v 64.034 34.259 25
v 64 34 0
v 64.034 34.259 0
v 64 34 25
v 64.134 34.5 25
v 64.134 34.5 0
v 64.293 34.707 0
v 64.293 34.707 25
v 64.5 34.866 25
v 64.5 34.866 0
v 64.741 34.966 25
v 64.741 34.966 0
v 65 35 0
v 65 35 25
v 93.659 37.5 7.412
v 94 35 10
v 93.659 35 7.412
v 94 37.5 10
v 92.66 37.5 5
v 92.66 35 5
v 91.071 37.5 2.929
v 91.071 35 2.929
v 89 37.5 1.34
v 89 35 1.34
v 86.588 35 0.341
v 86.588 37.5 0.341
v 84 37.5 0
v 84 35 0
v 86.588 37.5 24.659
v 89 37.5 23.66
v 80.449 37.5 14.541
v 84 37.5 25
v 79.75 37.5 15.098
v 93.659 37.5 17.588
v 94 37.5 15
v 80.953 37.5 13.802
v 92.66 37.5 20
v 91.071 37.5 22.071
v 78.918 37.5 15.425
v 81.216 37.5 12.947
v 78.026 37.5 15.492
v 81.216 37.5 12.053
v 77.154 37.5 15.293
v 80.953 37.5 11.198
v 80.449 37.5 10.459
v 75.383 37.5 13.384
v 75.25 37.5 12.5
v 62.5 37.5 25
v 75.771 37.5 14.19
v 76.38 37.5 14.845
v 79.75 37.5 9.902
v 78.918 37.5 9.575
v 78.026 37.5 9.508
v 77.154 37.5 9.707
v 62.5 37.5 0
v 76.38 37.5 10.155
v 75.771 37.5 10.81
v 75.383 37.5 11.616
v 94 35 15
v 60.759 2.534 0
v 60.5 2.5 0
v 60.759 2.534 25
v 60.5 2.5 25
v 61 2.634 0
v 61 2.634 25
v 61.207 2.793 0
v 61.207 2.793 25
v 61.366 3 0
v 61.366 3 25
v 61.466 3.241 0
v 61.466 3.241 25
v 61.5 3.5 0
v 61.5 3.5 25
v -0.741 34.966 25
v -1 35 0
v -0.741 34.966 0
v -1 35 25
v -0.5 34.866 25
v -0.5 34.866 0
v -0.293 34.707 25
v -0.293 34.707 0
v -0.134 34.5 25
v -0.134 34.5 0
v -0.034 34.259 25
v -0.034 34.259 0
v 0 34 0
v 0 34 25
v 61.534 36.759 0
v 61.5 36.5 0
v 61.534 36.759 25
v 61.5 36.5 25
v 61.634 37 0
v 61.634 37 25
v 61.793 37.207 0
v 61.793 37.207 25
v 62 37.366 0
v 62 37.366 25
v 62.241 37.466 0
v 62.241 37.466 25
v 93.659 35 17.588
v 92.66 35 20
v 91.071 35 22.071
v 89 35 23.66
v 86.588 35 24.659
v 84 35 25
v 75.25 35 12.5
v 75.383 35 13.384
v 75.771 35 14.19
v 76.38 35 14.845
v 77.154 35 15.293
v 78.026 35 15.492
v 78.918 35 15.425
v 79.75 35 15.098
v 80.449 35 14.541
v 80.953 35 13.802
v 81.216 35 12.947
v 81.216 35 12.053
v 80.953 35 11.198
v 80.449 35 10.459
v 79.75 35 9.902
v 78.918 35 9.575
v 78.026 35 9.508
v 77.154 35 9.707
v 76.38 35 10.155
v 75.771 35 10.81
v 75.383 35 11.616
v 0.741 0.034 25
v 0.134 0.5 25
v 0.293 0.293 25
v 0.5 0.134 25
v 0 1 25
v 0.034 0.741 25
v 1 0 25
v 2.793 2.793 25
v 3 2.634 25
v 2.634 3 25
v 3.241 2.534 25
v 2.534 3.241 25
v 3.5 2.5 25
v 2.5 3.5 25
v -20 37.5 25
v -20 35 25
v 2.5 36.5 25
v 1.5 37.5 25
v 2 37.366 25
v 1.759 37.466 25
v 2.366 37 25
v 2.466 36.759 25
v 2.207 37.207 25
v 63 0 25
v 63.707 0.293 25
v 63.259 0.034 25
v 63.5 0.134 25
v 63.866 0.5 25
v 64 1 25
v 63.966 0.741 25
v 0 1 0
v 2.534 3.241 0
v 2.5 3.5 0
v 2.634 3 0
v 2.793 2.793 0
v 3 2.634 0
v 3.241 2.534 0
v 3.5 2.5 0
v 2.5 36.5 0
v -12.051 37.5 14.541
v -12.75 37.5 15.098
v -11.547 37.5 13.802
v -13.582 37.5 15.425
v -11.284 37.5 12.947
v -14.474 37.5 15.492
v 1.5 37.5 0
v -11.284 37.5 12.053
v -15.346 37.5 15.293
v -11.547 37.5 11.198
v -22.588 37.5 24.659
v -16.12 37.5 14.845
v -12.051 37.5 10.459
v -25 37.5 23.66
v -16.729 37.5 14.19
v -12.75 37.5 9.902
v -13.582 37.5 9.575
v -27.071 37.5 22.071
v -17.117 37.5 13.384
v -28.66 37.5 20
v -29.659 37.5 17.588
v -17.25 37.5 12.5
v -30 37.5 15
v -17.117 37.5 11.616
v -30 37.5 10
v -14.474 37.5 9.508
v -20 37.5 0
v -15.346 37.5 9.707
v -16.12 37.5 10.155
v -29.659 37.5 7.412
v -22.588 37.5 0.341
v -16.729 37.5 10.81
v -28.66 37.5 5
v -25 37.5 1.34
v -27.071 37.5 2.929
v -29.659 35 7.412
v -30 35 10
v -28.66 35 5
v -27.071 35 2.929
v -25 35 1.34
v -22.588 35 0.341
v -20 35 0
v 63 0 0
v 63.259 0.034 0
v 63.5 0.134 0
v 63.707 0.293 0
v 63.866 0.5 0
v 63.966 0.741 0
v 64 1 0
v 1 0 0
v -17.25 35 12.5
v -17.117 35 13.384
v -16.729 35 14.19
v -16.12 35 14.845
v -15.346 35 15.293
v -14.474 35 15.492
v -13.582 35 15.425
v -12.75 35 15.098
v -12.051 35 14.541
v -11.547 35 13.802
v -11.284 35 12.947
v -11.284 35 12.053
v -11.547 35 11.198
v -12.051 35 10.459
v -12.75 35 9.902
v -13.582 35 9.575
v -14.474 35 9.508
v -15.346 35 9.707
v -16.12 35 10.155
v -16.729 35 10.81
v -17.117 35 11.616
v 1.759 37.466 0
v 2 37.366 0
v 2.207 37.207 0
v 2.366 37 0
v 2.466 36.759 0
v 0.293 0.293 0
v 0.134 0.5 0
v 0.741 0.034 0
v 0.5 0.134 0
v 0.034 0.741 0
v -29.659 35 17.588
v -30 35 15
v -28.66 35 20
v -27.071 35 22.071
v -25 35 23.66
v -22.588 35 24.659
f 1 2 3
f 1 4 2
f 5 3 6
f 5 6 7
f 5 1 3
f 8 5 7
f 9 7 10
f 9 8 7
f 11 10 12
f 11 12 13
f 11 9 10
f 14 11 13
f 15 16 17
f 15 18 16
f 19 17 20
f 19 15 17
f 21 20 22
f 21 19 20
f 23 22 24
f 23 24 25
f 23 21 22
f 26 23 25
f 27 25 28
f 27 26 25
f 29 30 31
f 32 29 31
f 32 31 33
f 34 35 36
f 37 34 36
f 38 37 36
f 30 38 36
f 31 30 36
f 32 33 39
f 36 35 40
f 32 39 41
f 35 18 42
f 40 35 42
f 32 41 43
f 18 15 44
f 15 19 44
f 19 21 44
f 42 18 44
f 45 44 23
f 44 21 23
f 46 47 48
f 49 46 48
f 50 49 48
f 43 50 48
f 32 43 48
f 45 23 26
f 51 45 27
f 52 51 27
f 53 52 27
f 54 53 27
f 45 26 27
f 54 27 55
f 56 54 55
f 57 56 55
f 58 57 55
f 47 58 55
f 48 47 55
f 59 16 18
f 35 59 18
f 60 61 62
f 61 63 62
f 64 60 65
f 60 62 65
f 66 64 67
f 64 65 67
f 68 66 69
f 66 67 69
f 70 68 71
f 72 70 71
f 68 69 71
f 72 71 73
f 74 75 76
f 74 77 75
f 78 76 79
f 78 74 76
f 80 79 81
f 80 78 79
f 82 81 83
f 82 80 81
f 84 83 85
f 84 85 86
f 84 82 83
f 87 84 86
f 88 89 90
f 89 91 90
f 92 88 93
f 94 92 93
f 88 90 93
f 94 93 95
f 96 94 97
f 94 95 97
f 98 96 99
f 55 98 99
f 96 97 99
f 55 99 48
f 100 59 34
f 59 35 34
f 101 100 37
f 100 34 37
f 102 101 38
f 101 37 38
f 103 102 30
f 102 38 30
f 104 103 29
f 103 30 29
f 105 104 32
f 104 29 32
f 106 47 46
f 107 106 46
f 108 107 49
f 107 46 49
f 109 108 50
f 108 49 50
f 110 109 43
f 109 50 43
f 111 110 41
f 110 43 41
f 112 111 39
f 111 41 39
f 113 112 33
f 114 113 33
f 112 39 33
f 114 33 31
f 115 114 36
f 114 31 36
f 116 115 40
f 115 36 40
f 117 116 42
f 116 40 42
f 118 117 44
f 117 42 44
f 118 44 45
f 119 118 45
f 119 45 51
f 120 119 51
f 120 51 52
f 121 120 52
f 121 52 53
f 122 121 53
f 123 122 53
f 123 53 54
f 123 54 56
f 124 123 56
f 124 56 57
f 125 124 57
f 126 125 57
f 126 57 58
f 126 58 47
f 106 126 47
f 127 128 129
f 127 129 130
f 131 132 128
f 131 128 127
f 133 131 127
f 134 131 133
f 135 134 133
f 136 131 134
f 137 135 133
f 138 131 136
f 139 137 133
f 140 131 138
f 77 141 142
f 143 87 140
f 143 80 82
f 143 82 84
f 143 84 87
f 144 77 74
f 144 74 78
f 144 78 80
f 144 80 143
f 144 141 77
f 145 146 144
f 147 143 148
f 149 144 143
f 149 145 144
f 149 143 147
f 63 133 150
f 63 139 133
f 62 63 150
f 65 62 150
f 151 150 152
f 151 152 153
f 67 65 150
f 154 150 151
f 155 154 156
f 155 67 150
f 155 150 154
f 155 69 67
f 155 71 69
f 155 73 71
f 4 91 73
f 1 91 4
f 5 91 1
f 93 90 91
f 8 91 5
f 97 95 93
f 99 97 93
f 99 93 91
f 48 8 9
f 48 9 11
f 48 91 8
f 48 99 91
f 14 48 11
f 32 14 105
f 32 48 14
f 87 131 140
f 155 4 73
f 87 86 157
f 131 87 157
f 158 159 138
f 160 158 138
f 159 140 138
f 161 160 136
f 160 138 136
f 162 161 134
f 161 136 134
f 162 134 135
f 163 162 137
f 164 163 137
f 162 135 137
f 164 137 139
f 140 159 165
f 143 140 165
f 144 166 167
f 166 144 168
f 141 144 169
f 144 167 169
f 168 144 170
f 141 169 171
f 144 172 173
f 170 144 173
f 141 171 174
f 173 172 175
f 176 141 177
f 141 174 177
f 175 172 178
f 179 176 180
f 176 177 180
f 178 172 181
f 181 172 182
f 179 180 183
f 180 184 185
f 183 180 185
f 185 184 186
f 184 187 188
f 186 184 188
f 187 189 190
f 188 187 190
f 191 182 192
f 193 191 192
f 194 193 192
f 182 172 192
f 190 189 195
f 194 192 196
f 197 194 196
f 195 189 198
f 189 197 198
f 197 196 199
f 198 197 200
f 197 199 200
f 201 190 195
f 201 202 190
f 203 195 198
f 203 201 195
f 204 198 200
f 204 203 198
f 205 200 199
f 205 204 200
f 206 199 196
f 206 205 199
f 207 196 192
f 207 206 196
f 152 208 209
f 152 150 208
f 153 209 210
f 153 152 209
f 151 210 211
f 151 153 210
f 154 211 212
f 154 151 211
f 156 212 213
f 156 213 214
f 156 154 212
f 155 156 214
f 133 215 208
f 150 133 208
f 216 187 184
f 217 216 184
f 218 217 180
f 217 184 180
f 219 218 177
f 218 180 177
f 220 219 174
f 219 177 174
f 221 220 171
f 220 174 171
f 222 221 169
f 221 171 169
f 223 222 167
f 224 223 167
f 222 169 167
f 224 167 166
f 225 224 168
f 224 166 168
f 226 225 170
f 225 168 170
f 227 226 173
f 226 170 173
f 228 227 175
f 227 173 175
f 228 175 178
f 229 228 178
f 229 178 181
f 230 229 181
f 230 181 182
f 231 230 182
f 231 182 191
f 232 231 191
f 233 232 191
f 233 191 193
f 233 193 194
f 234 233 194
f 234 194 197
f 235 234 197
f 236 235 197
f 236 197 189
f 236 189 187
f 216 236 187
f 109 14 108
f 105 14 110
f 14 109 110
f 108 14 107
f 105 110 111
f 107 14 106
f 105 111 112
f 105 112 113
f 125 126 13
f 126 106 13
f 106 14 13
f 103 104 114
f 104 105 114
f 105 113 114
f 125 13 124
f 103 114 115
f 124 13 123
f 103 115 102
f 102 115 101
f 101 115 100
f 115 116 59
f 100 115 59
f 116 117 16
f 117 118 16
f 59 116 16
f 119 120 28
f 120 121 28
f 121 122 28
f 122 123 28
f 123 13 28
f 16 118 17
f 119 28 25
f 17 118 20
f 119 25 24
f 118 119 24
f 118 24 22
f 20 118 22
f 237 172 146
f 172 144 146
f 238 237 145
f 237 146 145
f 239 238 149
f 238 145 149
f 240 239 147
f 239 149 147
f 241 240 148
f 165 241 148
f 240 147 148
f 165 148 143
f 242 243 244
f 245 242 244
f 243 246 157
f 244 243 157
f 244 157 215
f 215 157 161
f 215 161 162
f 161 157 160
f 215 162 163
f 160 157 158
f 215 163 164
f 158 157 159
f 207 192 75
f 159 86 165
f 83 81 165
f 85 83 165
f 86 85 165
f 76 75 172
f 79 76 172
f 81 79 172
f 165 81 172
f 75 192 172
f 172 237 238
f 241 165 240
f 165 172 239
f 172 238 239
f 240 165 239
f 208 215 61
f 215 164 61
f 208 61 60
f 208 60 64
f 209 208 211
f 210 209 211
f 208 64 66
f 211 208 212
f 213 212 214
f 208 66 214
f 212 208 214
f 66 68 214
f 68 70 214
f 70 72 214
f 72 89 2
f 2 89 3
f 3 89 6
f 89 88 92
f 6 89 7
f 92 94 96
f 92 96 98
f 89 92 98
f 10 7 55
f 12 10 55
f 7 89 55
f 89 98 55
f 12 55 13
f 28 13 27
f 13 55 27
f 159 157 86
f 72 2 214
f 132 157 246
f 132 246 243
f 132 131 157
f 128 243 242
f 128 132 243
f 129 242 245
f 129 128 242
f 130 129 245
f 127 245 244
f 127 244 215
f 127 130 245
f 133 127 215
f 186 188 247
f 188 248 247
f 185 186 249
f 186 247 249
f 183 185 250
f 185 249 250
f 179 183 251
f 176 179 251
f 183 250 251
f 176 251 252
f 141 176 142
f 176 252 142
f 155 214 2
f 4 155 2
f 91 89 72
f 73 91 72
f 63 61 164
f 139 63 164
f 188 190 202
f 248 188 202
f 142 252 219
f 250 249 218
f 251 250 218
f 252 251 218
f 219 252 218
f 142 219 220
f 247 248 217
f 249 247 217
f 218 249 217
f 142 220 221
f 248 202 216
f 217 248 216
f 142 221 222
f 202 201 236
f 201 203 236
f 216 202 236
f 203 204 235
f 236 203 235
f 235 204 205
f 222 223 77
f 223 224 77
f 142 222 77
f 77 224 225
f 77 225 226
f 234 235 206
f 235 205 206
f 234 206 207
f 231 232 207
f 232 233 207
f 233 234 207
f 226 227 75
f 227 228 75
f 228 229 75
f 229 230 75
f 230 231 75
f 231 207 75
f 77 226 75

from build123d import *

# Parameters (mm, degrees)
F1_DEPTH = 25
F2_R     = 10
F3_R     = 1
F4_R     = 3
F5_DEPTH = 25


with BuildPart() as f1:
    # F0 (on Top) → F1 (new body)
    with BuildSketch(Plane.XY):
        Polygon((-30, 37.5), (-30, 35), (0, 35), (0, 0), (64, 0), (64, 35), (94, 35), (94, 37.5), (61.5, 37.5), (61.5, 2.5), (2.5, 2.5), (2.5, 37.5), align=None)
    extrude(amount=F1_DEPTH)

    # F2
    f2_edges = [f1.edges().sort_by_distance(p)[0] for p in [
        (-30, 36.25, 25),
        (-30, 36.25, 0),
        (94, 36.25, 0),
        (94, 36.25, 25),
    ]]
    fillet(f2_edges, radius=F2_R)

    # F3
    f3_edges = [f1.edges().sort_by_distance(p)[0] for p in [
        (64, 35, 12.5),
        (64, 0, 12.5),
        (0, 0, 12.5),
        (0, 35, 12.5),
        (2.5, 37.5, 12.5),
        (2.5, 2.5, 12.5),
        (61.5, 2.5, 12.5),
        (61.5, 37.5, 12.5),
    ]]
    fillet(f3_edges, radius=F3_R)

    # F4 (on face) → F5 (cut)
    with BuildSketch(Plane(origin=(0, 37.5, 0), x_dir=(-1, 0, 0), z_dir=(0, 1, 0))):
        with Locations((14.25, 12.5)):
            Circle(F4_R)
        with Locations((-78.25, 12.5)):
            Circle(F4_R)
    extrude(amount=-F5_DEPTH, mode=Mode.SUBTRACT)


solid = f1.part
